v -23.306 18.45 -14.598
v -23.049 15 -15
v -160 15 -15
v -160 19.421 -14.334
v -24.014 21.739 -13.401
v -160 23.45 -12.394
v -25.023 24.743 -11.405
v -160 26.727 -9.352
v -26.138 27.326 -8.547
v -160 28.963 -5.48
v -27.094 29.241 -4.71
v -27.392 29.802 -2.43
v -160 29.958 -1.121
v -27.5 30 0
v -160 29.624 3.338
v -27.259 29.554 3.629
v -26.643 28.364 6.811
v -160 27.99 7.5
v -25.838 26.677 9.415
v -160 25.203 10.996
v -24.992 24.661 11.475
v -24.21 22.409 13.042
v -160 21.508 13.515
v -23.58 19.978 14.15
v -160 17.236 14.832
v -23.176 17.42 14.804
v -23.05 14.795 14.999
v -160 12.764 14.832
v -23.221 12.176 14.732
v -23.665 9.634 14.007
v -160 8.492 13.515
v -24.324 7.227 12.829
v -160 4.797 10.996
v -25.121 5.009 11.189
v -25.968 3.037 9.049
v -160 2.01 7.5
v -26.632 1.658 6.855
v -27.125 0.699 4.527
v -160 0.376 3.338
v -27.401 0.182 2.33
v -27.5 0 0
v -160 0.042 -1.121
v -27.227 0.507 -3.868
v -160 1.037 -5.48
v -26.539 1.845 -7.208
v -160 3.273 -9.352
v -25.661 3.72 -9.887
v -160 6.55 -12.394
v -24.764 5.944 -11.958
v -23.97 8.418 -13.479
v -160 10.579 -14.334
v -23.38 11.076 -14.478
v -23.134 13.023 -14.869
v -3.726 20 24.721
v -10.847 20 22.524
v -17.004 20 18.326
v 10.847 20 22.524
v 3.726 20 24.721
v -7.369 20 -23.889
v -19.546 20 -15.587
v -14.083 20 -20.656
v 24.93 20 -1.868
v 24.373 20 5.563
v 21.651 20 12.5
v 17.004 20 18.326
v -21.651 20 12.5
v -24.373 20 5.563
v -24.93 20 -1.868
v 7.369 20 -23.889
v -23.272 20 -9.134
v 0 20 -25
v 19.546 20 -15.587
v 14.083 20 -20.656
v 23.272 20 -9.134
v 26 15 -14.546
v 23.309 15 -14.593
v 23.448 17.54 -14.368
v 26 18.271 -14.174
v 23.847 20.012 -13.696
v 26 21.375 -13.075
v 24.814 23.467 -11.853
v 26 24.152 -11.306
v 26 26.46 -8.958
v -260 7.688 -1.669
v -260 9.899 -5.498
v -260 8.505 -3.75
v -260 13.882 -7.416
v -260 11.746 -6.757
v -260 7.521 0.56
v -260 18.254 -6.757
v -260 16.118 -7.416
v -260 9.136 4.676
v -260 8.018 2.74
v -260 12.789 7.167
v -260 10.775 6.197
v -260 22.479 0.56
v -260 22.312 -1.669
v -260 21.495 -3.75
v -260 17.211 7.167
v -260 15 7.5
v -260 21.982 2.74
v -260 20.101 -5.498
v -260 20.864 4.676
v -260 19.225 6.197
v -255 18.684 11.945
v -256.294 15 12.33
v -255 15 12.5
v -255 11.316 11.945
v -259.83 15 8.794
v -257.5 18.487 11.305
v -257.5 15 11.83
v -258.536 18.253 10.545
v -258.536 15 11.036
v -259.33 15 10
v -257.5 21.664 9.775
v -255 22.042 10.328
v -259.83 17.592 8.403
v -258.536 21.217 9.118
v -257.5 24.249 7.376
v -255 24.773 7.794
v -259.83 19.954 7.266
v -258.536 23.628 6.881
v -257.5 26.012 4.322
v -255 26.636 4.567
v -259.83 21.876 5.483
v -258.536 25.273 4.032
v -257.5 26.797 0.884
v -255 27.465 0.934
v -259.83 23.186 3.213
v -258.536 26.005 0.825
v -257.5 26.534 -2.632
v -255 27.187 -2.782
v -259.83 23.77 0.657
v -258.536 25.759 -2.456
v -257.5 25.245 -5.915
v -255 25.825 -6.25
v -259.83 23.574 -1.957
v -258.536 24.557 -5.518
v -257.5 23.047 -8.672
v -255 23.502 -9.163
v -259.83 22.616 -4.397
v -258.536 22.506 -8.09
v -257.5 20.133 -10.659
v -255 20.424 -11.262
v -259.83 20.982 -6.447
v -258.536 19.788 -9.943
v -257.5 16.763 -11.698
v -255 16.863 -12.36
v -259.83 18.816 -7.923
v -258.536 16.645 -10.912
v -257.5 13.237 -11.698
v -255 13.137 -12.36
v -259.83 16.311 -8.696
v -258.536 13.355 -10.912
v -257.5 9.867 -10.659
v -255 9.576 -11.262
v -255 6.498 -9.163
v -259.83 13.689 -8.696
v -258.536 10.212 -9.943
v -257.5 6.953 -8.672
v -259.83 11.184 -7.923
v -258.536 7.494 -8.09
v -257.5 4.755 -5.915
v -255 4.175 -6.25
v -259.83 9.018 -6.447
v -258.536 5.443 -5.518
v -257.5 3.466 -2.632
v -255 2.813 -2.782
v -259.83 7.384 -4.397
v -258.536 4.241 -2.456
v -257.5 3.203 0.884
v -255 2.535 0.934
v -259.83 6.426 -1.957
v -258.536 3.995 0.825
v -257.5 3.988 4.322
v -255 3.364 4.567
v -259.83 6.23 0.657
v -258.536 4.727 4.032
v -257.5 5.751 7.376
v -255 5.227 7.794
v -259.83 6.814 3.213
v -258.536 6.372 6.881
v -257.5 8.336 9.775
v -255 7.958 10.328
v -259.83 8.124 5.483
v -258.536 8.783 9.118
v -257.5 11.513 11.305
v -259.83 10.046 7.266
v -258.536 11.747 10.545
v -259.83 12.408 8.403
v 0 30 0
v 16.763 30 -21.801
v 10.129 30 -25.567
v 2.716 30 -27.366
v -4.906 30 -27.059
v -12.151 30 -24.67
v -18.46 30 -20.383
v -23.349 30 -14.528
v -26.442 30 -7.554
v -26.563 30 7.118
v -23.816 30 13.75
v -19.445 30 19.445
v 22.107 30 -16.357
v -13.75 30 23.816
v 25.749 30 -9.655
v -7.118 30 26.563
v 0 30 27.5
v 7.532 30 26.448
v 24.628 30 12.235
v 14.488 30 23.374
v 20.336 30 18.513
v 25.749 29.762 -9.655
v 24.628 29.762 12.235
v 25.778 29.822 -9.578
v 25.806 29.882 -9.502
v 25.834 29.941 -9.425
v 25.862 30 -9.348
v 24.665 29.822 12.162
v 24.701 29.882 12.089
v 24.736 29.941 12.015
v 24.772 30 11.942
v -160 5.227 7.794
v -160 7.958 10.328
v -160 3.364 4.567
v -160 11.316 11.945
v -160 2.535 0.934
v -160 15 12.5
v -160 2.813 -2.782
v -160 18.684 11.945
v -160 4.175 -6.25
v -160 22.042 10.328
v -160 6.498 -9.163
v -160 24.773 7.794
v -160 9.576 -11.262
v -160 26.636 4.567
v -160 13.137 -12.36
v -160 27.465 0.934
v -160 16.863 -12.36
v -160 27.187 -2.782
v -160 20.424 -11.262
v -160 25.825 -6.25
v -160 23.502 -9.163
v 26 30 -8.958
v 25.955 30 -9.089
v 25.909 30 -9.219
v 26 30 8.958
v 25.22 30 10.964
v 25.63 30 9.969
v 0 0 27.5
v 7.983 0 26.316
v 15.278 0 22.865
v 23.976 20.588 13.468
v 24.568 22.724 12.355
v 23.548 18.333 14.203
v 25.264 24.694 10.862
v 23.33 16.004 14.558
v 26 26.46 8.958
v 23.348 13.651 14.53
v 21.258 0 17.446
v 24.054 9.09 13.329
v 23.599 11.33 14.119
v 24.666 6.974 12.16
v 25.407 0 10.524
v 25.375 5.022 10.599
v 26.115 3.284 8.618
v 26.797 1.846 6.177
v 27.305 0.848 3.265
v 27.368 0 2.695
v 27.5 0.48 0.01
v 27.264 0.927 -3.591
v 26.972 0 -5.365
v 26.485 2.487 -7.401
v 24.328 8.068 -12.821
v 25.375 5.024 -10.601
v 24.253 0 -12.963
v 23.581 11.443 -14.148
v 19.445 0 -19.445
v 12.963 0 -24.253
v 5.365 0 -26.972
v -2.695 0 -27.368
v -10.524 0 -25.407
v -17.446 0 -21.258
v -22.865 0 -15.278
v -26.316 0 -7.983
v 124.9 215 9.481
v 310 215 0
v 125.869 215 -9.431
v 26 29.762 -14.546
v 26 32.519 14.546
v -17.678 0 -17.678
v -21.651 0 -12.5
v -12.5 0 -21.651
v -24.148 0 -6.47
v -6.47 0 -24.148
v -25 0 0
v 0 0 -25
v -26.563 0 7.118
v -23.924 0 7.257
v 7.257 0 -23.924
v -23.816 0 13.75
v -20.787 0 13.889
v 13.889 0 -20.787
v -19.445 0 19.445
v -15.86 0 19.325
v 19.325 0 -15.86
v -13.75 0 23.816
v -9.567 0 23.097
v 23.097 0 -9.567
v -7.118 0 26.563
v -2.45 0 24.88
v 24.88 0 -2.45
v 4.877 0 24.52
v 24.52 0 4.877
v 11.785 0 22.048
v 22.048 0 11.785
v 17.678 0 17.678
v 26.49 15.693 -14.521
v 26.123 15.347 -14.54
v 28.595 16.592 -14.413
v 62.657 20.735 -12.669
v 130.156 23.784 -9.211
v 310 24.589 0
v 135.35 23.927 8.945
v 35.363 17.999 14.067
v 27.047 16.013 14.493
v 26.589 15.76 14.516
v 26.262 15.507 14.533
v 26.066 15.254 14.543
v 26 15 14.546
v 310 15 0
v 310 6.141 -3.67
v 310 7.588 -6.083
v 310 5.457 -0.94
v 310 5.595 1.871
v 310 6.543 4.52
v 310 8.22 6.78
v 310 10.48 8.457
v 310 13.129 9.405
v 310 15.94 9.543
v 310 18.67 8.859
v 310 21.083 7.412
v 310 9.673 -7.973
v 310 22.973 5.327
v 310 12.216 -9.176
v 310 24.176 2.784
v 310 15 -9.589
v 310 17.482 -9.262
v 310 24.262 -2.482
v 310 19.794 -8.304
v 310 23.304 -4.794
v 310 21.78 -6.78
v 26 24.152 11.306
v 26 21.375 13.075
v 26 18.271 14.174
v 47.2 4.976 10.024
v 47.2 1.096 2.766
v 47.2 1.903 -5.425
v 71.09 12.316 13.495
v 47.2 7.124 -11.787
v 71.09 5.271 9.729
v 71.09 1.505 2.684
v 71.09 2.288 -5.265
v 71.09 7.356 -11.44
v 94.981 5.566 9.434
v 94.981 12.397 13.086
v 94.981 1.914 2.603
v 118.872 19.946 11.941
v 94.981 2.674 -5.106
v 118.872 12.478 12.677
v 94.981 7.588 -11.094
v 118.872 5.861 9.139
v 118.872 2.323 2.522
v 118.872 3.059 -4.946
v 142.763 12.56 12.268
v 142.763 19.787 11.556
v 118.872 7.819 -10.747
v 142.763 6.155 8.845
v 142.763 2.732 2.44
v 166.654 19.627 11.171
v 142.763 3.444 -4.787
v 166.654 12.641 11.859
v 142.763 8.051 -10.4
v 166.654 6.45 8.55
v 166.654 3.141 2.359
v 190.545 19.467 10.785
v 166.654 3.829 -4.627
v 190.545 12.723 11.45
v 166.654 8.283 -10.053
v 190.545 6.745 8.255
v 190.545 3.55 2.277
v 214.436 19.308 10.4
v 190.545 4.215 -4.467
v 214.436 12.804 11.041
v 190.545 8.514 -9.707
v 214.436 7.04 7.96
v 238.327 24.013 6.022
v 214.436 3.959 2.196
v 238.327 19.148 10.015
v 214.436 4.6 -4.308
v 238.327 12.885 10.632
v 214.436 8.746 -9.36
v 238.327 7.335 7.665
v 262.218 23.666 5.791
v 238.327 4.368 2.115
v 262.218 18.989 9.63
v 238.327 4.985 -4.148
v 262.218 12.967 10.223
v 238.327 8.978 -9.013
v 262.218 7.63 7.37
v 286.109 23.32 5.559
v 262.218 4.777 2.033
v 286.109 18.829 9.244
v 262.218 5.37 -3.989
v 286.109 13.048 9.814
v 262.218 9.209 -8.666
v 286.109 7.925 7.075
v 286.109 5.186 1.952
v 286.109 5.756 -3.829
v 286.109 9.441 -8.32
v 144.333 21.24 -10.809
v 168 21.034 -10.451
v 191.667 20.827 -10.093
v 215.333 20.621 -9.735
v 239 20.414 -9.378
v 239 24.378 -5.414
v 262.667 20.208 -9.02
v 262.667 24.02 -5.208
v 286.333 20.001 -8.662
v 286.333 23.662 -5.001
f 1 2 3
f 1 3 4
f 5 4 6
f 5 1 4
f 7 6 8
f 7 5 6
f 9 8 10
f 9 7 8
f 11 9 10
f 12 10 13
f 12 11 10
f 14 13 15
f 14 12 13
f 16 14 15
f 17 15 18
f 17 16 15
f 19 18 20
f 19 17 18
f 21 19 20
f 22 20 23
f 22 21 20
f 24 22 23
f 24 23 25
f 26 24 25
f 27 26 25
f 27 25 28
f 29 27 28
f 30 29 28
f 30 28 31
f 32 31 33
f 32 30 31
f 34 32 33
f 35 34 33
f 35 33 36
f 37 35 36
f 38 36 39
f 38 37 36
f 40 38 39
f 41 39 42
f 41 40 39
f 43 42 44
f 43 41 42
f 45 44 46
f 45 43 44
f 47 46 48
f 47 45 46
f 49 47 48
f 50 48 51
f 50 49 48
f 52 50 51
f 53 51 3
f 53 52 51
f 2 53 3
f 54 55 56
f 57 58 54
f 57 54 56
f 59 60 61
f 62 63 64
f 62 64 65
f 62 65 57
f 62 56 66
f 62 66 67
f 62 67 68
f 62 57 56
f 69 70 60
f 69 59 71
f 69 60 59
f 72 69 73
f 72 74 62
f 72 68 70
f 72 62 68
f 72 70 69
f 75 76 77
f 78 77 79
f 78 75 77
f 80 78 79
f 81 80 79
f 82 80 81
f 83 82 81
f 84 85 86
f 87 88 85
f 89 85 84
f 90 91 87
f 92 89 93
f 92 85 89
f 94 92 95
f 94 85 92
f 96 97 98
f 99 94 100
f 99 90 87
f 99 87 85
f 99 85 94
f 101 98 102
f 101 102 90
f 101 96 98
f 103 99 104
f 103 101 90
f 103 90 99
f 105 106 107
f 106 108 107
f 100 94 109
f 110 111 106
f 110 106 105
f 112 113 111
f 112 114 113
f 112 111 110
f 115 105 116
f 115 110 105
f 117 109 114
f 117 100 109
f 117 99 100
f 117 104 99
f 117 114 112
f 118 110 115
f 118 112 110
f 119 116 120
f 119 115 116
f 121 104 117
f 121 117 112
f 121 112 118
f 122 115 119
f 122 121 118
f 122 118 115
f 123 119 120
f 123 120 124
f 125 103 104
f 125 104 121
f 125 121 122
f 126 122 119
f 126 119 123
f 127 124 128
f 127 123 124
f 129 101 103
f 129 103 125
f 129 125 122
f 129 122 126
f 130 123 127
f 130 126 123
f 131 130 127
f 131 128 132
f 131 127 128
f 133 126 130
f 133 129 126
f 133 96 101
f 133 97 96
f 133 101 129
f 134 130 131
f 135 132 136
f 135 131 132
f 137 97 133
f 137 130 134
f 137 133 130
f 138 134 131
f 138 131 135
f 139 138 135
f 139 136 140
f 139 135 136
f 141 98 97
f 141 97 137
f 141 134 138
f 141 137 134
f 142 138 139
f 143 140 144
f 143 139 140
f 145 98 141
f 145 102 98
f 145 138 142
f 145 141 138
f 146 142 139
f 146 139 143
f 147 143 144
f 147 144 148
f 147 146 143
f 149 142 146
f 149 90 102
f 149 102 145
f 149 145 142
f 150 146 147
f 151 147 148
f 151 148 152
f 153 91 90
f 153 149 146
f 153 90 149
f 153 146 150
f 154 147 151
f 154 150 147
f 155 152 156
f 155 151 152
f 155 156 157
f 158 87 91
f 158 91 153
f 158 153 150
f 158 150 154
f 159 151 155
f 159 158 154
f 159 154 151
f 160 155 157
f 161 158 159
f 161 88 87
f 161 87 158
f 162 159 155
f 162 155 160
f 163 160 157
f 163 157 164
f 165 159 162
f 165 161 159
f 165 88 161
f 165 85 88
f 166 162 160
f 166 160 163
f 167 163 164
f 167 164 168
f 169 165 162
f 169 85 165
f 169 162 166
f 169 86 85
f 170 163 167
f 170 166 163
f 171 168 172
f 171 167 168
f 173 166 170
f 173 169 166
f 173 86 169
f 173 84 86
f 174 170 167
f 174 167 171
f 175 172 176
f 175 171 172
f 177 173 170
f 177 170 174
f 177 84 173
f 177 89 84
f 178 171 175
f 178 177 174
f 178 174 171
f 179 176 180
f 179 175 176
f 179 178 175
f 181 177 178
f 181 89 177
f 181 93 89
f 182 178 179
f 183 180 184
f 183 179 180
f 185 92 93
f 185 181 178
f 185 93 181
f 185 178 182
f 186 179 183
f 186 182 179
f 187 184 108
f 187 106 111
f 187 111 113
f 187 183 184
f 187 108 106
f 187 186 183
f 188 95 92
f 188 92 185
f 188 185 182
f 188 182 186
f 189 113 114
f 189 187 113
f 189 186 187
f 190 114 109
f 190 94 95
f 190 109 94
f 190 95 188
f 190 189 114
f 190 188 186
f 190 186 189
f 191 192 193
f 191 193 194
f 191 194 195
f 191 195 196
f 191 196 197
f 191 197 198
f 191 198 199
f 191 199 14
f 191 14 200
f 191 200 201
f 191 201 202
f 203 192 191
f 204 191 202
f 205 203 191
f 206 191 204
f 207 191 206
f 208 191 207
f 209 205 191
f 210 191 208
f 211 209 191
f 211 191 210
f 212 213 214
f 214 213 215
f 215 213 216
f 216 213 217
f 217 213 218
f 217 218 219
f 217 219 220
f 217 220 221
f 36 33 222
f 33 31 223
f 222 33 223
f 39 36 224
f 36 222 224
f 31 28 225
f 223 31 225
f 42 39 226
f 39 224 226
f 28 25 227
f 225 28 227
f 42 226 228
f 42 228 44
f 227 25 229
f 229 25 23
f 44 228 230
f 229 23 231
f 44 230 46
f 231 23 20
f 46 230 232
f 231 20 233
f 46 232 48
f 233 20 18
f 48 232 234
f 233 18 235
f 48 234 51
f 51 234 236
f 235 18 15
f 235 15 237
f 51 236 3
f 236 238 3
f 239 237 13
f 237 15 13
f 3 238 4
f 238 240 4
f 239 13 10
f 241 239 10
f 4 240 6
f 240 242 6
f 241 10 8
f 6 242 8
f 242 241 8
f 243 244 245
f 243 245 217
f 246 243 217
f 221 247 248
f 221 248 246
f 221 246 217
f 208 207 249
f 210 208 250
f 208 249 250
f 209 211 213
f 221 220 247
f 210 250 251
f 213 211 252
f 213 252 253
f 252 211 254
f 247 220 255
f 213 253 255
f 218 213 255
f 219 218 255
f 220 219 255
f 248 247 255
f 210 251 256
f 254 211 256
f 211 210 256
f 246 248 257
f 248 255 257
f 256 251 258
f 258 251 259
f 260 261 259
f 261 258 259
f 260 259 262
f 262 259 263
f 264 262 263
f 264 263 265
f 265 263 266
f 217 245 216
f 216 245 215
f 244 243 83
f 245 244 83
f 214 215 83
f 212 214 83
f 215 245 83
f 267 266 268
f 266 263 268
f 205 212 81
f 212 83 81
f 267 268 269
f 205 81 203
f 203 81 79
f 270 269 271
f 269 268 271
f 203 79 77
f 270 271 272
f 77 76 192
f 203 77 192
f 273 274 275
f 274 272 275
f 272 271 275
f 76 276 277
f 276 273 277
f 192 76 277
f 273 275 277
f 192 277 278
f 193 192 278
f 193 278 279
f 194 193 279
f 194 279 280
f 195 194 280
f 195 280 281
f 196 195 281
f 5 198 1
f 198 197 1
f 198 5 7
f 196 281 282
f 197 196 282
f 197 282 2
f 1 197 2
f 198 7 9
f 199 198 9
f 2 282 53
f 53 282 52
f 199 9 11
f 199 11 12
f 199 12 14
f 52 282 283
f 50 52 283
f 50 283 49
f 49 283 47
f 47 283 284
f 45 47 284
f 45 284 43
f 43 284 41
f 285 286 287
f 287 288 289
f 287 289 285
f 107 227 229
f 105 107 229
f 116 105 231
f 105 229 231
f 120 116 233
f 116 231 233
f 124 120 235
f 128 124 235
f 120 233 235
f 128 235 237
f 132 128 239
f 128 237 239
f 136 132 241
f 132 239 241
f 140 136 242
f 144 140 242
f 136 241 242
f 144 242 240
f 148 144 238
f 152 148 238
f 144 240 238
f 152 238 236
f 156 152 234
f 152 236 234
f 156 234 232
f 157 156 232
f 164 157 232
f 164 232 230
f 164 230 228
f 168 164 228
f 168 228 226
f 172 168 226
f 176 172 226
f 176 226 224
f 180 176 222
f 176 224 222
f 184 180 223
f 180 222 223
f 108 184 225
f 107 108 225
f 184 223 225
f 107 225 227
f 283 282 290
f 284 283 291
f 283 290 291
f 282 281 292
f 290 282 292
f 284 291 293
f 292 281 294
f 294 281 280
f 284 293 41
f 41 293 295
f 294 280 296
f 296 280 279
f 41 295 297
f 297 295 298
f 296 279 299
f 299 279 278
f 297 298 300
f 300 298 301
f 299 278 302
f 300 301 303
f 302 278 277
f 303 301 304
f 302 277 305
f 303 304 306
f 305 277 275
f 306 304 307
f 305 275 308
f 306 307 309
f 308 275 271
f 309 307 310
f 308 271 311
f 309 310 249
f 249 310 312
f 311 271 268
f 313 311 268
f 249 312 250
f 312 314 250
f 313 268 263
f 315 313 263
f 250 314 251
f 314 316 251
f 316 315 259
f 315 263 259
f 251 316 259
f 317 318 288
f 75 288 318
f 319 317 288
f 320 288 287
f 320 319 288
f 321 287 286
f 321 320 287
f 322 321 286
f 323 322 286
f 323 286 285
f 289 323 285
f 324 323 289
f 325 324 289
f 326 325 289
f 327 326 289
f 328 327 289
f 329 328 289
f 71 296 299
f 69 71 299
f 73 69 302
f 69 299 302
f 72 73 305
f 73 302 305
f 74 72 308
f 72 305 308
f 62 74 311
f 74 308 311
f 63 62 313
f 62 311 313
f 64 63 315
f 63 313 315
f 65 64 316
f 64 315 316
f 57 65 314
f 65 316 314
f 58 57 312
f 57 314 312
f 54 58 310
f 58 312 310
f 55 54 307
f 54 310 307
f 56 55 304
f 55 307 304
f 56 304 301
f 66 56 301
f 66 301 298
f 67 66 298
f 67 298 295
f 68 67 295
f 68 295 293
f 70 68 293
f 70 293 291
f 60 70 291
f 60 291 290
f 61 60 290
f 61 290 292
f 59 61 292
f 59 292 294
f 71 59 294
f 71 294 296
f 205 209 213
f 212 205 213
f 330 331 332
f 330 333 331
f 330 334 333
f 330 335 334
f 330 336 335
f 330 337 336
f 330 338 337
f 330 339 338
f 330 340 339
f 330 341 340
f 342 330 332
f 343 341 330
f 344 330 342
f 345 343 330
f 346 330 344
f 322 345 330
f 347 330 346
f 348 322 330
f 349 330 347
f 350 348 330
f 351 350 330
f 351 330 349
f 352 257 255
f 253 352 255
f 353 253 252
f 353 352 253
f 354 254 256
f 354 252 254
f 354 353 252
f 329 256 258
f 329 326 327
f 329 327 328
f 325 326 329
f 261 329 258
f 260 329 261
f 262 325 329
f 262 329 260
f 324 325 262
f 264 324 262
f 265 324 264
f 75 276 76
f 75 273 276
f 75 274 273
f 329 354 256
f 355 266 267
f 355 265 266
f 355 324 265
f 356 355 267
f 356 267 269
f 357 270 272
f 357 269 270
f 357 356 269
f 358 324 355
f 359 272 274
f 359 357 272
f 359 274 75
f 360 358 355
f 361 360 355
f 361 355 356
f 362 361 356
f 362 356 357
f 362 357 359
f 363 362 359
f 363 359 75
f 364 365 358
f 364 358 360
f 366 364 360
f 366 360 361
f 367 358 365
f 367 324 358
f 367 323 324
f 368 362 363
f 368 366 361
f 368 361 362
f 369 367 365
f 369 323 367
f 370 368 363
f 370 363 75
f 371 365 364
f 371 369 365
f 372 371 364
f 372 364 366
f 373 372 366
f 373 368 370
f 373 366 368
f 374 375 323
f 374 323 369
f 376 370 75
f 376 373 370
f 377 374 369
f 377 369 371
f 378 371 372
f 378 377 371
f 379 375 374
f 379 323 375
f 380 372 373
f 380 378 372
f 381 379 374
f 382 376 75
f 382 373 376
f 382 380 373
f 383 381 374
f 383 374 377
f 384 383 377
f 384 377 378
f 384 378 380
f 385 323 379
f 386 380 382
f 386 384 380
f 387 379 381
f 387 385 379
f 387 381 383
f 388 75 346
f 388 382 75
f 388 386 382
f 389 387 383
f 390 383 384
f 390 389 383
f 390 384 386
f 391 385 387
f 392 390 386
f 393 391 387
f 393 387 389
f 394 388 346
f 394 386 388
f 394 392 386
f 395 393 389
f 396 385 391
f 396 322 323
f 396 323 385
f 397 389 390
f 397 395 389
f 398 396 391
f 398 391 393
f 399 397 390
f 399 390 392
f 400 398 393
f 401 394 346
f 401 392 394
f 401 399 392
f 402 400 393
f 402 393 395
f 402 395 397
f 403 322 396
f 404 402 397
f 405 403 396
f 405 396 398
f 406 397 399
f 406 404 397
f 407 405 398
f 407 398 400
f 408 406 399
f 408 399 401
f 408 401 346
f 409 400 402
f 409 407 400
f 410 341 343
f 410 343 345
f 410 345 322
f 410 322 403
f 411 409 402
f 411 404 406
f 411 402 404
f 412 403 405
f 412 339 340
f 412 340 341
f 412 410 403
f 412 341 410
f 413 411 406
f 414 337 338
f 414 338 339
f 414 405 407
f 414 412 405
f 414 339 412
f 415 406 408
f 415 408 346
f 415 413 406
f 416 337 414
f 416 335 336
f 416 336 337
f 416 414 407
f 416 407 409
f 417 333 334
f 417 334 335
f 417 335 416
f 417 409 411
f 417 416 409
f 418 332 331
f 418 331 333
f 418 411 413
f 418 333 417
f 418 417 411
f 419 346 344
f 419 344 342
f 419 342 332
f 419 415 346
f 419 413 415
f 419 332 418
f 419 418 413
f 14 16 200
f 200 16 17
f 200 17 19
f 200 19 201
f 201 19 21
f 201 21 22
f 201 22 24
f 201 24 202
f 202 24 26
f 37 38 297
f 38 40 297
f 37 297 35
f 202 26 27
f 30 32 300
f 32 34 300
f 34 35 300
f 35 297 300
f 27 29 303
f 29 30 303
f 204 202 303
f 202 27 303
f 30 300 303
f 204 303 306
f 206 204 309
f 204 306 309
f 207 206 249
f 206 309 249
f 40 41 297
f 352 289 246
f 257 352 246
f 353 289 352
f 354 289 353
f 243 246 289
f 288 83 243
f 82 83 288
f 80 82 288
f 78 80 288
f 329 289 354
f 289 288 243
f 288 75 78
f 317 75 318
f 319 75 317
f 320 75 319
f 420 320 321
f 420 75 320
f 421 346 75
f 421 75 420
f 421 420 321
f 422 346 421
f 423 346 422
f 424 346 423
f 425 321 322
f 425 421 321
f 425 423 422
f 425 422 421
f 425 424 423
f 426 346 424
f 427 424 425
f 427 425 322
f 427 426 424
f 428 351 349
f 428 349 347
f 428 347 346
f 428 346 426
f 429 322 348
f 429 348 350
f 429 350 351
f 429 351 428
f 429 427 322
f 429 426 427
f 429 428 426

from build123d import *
from build123d.topology import SkipClean

# Parameters (mm, degrees)
SKETCH1_R                     = 27.5
BOSS_EXTRUDE1_DEPTH           = 30
SKETCH4_R                     = 15
BOSS_EXTRUDE3_DEPTH           = 310
BOSS_EXTRUDE3_TAPER           = 1
BOSS_EXTRUDE3_OTHER_WAY_DEPTH = 160
SKETCH5_R                     = 12.5
BOSS_EXTRUDE4_DEPTH           = 100
FILLET1_R                     = 5
BOSS_EXTRUDE5_DEPTH           = 200
SKETCH2_R                     = 25
CUT_EXTRUDE4_DEPTH            = 20
CUT_EXTRUDE6_DEPTH            = 50


with BuildPart() as part:
    # Sketch1 → Boss-Extrude1 (new body)
    with BuildSketch(Plane(origin=(0, 0, 0), x_dir=(1, 0, 0), z_dir=(0, 1, 0))):
        with Locations(Location((0, 0, 0), (0, 0, 270))):
            Circle(SKETCH1_R)
    extrude(amount=BOSS_EXTRUDE1_DEPTH)

    # Sketch4 → Boss-Extrude3 (add)
    with BuildSketch(Plane(origin=(0, 0, 0), x_dir=(0, 0, -1), z_dir=(1, 0, 0))):
        with Locations((0, 15)):
            Circle(SKETCH4_R)
    extrude(amount=BOSS_EXTRUDE3_DEPTH, taper=BOSS_EXTRUDE3_TAPER)

    # Sketch4 → Boss-Extrude3 other way (add)
    with SkipClean():  # the faces are left unmerged after this step: merging them gives an invalid solid
        with BuildSketch(Plane(origin=(0, 0, 0), x_dir=(0, 0, -1), z_dir=(1, 0, 0))):
            with Locations((0, 15)):
                Circle(SKETCH4_R)
        extrude(amount=-BOSS_EXTRUDE3_OTHER_WAY_DEPTH)

    # Sketch5 → Boss-Extrude4 (add)
    with SkipClean():  # the faces are left unmerged after this step: merging them gives an invalid solid
        with BuildSketch(Plane.ZY.offset(160)):
            with Locations((0, 15)):
                Circle(SKETCH5_R)
        extrude(amount=BOSS_EXTRUDE4_DEPTH)

    # Fillet1
    fillet1_edges = [part.edges().sort_by_distance(p)[0] for p in [
        (-260, 15, -12.5),
    ]]
    fillet(fillet1_edges, radius=FILLET1_R)

    # Sketch7 → Boss-Extrude5 (add)
    with SkipClean():  # the faces are left unmerged after this step: merging them gives an invalid solid
        with BuildSketch(Plane(origin=(0, 15, 0), x_dir=(1, 0, 0), z_dir=(0, 1, 0))):
            Polygon((26, -14.546168312), (26, 14.546168312), (310, 0), align=None)
        extrude(amount=BOSS_EXTRUDE5_DEPTH)

    # Sketch2 → Cut-Extrude4 (cut)
    with SkipClean():  # the faces are left unmerged after this step: merging them gives an invalid solid
        with BuildSketch(Plane.XZ):
            with Locations(Location((0, 0, 0), (0, 0, 270))):
                Circle(SKETCH2_R)
        extrude(amount=-CUT_EXTRUDE4_DEPTH, mode=Mode.SUBTRACT)

    # Sketch9 → Cut-Extrude6 (cut)
    with SkipClean():  # the faces are left unmerged after this step: merging them gives an invalid solid
        with BuildSketch(Plane(origin=(0.811118683, 0, -15.836315168), x_dir=(-0.9986908871720133, 0, -0.0511518511842649), z_dir=(0.0511518511842649, 0, -0.9986908871720134))):
            Polygon((-25.22189963, 29.762241759), (-125.22189963, 215), (-25.22189963, 215), align=None)
        extrude(amount=-CUT_EXTRUDE6_DEPTH, mode=Mode.SUBTRACT)


solid = part.part
